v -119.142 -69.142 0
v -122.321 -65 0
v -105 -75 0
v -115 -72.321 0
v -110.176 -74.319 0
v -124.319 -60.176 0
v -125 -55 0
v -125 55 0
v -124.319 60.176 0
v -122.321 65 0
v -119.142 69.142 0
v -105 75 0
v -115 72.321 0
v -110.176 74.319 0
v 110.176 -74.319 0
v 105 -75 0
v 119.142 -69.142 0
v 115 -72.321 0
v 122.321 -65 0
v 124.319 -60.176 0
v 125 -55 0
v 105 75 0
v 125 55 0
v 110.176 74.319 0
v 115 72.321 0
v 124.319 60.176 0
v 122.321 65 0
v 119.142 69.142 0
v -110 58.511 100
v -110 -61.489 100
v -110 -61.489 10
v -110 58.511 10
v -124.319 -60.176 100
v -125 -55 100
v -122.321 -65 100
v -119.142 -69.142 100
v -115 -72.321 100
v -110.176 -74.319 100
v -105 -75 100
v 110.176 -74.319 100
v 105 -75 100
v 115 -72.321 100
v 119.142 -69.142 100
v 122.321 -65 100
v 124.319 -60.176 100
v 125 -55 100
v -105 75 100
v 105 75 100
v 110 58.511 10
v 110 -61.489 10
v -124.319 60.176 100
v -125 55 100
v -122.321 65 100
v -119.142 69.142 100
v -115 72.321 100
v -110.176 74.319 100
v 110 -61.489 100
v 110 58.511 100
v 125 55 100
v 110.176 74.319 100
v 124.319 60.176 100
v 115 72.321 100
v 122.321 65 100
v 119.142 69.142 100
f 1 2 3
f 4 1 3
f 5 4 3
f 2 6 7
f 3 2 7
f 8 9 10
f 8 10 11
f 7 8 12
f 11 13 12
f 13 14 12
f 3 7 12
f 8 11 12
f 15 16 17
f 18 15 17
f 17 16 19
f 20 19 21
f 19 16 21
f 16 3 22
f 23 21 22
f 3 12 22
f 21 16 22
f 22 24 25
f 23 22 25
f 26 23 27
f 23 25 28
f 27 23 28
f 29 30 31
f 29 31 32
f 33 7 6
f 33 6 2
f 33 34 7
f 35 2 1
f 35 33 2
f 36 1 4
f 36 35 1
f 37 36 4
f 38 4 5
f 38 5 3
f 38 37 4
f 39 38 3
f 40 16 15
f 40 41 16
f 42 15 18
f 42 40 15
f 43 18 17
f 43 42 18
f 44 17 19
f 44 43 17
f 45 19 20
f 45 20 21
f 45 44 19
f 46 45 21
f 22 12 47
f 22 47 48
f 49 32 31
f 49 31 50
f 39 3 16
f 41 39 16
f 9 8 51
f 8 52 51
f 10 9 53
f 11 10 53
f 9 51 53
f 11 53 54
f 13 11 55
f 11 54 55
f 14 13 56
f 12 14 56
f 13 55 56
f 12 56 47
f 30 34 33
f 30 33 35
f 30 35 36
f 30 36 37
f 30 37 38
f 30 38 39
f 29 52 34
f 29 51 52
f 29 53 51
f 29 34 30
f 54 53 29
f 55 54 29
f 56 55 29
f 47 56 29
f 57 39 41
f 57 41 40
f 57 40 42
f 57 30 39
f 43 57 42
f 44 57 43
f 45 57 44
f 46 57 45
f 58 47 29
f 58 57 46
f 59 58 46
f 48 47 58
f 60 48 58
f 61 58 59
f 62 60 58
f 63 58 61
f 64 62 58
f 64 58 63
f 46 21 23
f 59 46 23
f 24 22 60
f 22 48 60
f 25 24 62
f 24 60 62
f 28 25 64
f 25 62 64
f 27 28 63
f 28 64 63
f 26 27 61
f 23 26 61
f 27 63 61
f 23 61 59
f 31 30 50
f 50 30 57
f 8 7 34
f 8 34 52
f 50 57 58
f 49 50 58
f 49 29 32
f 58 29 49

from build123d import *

# Parameters (mm, degrees)
F0_W     = 250
F0_H     = 150
F1_DEPTH = 100
F2_W     = 220
F2_H     = 120
F3_DEPTH = 90
F4_R     = 20


with BuildPart() as f1:
    # F0 (on Top) → F1 (new body)
    with BuildSketch(Plane.XY):
        Rectangle(F0_W, F0_H)
    extrude(amount=F1_DEPTH)

    # F2 (on face) → F3 (cut)
    with BuildSketch(Plane.XY.offset(100)):
        with Locations((0, -1.488753)):
            Rectangle(F2_W, F2_H)
    extrude(amount=-F3_DEPTH, mode=Mode.SUBTRACT)

    # F4
    f4_edges = [f1.edges().sort_by_distance(p)[0] for p in [
        (125, -75, 50),
        (125, 75, 50),
        (-125, 75, 50),
        (-125, -75, 50),
    ]]
    fillet(f4_edges, radius=F4_R)


solid = f1.part
